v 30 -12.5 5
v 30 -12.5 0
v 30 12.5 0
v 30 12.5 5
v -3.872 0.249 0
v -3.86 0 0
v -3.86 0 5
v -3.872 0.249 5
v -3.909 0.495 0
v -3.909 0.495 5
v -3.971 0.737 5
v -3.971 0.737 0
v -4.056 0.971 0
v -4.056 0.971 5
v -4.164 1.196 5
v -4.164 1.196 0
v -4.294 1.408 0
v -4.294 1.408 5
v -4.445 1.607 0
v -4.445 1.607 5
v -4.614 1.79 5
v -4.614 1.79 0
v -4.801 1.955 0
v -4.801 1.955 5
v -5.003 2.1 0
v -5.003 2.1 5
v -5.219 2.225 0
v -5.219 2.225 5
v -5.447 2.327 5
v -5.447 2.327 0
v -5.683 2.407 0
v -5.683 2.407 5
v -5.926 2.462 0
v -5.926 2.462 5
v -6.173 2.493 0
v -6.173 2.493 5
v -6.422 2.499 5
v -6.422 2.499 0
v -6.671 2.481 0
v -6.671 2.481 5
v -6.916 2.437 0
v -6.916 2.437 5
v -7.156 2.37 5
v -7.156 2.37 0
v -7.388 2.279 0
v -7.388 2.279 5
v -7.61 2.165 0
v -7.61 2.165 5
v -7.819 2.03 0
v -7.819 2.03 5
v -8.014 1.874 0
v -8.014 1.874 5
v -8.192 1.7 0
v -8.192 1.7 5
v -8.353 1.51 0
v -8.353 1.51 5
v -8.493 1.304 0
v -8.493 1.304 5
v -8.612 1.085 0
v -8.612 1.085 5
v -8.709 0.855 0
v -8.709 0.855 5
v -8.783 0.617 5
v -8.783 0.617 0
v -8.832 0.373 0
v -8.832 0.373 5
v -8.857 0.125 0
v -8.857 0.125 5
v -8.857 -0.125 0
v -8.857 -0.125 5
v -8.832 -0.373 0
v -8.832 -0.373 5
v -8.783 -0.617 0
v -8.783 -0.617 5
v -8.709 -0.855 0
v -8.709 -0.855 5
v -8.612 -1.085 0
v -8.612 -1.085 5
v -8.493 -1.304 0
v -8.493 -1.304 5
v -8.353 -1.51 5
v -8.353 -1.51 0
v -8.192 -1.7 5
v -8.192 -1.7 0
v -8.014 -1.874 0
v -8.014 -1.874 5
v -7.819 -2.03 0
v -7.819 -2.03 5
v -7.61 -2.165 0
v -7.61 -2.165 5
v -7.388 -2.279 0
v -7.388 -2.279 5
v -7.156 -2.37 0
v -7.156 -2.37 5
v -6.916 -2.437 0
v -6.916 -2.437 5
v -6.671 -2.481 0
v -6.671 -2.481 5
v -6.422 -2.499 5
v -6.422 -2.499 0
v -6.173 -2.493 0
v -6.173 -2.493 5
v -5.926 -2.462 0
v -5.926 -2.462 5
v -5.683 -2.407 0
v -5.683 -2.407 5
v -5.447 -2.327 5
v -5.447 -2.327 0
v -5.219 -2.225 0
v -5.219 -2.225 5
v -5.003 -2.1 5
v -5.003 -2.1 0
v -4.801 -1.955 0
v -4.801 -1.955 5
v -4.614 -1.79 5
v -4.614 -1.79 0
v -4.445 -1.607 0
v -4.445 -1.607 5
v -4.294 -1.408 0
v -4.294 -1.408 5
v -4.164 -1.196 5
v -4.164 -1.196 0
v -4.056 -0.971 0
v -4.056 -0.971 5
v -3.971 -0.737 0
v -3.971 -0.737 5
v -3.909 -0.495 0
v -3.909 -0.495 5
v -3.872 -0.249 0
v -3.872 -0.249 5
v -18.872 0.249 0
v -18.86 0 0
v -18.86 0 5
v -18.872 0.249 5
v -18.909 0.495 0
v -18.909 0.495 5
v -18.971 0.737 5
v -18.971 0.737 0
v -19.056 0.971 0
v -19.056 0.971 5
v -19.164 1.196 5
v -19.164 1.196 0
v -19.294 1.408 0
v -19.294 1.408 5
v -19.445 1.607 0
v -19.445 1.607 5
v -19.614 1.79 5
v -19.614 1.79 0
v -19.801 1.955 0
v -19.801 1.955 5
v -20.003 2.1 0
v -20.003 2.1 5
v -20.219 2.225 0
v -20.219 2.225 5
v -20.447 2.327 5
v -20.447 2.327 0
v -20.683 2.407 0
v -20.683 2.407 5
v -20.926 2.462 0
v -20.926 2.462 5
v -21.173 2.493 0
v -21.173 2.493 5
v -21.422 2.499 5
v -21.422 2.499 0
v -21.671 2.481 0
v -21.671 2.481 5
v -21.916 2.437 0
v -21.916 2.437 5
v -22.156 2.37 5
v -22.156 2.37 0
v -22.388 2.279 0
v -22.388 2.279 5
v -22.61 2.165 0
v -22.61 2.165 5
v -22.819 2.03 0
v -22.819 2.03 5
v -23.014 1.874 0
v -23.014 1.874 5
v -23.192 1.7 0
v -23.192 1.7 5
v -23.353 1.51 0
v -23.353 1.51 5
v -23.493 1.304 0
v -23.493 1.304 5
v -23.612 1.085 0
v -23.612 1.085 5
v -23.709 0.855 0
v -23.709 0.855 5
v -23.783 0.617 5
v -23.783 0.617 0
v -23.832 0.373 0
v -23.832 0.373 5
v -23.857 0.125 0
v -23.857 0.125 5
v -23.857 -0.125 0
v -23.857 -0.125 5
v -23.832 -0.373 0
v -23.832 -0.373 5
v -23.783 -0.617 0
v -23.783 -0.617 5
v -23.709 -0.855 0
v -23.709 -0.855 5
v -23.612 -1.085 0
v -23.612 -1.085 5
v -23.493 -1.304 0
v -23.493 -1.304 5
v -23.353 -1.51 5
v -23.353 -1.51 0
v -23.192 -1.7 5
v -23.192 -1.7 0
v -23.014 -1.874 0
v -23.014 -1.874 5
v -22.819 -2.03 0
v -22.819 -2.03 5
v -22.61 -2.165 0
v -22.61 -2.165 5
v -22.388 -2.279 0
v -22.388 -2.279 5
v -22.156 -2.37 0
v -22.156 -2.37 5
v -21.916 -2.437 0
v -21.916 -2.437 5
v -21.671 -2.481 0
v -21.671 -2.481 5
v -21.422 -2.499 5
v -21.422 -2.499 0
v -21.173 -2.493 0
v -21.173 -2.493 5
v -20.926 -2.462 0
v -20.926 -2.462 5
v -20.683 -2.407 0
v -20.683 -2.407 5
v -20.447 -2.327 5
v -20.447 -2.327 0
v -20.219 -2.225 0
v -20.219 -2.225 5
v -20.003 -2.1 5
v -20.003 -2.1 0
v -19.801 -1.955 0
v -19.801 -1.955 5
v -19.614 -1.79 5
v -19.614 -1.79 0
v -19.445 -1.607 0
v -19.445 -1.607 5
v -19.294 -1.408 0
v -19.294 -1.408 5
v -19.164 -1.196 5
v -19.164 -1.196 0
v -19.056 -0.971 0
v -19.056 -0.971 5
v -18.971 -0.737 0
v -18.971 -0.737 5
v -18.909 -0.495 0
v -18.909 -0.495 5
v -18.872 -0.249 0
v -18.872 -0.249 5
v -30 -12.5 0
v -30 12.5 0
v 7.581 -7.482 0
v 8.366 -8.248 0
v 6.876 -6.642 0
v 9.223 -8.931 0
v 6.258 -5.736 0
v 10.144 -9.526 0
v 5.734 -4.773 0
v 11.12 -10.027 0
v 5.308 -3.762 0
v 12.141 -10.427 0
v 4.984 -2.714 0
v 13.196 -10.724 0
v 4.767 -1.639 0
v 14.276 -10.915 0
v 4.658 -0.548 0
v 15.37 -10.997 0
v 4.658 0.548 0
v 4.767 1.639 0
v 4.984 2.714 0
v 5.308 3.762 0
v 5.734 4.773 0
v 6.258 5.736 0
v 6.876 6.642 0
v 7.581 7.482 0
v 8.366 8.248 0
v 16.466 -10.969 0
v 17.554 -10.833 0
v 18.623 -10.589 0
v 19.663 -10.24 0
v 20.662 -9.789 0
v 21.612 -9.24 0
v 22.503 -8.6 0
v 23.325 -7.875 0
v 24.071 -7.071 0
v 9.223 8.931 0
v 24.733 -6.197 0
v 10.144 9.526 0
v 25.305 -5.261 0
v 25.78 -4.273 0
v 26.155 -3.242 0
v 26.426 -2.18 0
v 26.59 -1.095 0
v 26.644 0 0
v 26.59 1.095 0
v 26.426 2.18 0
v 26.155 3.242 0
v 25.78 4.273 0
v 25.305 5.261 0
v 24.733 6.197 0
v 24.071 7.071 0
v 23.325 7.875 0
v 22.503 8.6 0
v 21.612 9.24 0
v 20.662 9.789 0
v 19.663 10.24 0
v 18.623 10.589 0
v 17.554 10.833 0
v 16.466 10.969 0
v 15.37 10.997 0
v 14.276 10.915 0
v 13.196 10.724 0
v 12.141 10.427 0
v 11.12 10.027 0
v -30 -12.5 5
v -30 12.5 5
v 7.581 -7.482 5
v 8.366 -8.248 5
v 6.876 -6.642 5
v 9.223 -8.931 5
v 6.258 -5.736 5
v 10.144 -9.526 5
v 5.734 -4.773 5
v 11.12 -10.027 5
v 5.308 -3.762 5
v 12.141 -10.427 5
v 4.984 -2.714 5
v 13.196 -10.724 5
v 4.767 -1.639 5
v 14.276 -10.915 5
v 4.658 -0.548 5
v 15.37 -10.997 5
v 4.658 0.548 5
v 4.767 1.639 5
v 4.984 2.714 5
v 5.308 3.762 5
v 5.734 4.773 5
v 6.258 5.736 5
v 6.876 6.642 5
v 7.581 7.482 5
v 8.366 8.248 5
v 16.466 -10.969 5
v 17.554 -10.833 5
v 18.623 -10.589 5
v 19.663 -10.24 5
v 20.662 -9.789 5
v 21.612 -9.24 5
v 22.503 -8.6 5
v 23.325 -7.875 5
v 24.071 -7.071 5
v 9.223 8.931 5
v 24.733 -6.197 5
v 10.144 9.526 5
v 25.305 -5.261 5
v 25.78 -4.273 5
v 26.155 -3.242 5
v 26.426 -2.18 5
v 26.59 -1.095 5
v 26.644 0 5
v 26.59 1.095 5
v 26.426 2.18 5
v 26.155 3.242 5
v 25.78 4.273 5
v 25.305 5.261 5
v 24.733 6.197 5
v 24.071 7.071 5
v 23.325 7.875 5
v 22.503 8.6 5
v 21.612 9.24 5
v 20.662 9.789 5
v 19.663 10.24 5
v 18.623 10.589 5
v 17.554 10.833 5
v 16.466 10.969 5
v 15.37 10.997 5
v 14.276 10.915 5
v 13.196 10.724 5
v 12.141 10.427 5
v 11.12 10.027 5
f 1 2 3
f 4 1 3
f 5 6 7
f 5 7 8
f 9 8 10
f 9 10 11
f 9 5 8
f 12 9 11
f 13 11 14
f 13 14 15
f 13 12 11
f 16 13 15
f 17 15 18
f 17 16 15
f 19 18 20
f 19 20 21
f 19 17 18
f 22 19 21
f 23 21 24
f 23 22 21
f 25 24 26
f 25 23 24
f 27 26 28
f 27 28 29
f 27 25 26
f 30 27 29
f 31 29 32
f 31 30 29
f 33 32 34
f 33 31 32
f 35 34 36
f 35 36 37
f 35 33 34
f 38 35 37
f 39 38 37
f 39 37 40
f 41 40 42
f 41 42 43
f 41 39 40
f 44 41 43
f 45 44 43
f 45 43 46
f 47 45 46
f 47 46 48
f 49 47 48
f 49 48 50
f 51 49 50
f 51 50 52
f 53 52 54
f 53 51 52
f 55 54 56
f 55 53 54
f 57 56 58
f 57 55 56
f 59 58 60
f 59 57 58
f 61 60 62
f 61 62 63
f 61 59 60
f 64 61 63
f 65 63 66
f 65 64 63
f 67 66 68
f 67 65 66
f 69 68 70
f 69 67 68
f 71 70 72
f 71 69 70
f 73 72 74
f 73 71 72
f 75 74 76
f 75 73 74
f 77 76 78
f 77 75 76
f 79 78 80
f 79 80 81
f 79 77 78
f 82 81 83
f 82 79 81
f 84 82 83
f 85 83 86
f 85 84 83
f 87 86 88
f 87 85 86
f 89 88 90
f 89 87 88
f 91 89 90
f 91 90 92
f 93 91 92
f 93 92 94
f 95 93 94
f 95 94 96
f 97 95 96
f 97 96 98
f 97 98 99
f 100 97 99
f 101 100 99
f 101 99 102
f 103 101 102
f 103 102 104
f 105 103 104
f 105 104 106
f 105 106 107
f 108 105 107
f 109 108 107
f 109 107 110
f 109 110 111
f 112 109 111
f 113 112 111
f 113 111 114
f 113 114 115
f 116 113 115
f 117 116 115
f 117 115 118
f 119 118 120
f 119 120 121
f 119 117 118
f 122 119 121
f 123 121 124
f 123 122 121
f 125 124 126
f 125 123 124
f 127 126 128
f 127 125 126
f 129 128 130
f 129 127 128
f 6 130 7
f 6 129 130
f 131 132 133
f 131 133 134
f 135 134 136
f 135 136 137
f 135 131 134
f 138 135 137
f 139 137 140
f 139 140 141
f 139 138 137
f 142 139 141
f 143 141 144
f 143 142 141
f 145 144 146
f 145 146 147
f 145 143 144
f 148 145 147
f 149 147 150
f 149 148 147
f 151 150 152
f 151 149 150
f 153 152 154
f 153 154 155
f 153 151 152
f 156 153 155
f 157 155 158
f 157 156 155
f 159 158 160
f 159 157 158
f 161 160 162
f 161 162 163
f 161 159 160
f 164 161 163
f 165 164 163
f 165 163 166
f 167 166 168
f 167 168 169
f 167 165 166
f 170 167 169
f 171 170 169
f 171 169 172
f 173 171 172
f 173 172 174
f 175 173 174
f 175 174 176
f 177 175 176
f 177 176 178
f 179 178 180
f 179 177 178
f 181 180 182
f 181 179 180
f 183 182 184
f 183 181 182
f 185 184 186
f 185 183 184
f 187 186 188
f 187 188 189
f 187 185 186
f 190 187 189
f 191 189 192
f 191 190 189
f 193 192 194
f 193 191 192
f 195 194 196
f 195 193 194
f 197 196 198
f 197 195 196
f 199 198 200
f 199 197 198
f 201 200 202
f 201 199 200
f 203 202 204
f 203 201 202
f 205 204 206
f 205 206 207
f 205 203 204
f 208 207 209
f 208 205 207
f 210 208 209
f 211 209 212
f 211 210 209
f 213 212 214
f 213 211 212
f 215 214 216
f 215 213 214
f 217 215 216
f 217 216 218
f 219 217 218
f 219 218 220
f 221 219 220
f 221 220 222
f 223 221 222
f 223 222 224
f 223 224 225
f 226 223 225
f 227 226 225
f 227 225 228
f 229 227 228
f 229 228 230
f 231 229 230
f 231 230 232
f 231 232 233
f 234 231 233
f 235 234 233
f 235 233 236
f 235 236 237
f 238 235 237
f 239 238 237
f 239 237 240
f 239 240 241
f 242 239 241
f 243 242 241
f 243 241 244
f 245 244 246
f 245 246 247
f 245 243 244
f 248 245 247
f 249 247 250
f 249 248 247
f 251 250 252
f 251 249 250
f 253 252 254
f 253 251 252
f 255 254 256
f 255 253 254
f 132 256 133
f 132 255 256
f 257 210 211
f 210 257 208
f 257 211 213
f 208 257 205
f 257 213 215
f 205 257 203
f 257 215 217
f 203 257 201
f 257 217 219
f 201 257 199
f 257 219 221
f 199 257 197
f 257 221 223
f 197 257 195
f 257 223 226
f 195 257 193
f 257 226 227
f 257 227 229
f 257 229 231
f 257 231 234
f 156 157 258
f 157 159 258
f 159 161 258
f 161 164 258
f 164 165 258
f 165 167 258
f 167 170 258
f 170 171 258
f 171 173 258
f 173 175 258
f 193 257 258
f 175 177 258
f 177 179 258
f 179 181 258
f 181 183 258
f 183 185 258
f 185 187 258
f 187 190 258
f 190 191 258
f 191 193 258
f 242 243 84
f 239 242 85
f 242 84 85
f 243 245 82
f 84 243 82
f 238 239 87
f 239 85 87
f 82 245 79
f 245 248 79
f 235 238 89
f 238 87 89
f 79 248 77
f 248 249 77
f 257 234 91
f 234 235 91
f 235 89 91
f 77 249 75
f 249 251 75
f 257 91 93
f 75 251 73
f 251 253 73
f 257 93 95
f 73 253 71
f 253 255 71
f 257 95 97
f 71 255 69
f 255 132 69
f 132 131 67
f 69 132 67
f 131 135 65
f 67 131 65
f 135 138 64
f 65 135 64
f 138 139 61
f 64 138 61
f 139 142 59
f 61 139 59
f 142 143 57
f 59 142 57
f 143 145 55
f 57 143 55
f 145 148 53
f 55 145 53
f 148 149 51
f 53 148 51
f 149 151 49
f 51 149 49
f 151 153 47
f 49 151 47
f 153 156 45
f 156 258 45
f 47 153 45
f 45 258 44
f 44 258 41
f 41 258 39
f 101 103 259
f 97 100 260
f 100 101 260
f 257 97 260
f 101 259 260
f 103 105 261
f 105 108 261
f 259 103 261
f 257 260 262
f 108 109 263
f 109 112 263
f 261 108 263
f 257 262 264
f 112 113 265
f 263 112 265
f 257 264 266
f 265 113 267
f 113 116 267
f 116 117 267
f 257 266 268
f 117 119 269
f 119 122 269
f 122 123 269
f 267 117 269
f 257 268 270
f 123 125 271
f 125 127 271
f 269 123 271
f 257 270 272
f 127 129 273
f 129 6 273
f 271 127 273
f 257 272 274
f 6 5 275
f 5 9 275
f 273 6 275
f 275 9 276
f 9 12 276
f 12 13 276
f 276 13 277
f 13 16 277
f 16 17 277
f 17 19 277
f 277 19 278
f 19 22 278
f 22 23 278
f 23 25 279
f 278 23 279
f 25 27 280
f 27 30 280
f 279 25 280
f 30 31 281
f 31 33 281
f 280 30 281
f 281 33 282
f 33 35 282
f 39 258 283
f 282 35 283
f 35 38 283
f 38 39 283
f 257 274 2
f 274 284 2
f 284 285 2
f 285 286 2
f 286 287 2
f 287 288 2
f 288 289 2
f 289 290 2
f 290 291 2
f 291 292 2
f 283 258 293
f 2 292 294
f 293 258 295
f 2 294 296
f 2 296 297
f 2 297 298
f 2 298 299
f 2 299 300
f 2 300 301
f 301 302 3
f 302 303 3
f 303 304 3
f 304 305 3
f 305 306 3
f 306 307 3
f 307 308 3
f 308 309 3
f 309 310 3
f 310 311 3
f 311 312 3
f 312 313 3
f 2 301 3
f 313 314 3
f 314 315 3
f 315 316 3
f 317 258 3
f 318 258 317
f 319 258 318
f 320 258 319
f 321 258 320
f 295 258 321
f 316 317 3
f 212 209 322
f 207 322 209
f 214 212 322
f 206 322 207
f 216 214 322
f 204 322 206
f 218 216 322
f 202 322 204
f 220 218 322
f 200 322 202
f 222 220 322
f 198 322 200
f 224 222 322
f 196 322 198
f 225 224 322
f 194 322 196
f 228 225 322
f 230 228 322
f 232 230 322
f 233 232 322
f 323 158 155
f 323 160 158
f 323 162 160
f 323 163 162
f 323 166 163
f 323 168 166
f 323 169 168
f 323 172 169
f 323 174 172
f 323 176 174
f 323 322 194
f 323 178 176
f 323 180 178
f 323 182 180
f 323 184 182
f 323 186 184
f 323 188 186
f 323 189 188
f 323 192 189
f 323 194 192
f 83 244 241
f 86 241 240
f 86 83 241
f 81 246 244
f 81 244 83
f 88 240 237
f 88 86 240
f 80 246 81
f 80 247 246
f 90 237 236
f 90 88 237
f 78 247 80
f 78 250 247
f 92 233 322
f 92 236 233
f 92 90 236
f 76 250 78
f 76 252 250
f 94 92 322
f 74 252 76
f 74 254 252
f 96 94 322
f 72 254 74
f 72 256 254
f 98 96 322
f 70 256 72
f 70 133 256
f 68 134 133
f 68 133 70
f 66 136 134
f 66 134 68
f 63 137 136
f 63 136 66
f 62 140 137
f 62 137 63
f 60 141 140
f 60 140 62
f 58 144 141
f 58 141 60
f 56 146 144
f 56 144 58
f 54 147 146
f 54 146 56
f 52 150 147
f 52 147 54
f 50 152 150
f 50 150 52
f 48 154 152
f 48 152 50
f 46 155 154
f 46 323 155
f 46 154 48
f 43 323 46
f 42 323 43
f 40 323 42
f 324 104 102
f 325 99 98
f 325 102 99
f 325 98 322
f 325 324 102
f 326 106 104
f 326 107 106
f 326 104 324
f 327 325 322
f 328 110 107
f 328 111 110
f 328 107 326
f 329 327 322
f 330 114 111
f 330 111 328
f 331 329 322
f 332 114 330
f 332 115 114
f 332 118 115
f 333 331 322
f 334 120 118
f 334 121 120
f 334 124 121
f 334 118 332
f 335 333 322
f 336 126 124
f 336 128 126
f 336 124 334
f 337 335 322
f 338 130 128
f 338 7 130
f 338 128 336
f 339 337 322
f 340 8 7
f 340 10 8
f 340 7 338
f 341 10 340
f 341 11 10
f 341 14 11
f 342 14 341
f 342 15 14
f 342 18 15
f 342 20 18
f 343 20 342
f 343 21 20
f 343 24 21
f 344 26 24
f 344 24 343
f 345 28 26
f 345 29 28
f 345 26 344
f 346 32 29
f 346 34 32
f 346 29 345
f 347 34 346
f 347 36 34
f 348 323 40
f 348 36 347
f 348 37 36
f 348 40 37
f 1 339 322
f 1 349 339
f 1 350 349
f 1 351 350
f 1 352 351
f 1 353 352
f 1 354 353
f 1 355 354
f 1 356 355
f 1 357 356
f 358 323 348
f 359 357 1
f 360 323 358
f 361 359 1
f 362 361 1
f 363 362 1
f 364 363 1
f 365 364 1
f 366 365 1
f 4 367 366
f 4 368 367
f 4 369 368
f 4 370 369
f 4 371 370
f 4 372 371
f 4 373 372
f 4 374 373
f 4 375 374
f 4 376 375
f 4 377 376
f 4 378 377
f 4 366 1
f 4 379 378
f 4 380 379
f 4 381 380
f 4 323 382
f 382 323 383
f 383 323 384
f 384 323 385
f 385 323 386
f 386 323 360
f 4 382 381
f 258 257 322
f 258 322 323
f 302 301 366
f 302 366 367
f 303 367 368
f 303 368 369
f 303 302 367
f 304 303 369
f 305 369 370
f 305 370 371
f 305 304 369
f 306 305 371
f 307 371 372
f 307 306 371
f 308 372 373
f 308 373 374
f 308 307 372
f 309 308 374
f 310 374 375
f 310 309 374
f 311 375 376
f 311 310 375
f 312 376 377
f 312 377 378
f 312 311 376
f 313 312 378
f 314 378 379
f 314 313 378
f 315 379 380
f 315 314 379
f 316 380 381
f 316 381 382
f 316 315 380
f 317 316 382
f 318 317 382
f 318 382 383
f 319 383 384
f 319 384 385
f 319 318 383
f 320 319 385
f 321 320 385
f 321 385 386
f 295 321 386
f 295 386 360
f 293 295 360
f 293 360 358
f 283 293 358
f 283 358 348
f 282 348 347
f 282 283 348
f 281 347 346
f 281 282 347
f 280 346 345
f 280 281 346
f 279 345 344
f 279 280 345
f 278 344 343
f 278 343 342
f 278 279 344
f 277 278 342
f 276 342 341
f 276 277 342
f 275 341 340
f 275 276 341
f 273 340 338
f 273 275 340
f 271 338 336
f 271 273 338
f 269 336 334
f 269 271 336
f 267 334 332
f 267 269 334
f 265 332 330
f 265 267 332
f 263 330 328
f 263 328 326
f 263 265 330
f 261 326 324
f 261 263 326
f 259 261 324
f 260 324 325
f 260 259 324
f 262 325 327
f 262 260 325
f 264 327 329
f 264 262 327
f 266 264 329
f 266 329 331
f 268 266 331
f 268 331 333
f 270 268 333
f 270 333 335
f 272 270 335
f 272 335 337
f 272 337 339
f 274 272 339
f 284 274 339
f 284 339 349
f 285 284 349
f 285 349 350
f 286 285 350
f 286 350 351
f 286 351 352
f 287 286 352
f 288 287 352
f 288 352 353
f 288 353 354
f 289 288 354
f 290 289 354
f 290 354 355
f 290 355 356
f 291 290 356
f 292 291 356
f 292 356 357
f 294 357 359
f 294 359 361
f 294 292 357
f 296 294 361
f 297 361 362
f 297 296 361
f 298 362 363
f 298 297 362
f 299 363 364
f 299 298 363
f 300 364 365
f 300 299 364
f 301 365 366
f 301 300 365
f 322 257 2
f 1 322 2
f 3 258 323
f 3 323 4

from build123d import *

# Parameters (mm, degrees)
SKETCH1_W           = 60
SKETCH1_H           = 25
SKETCH1_R           = 2.5
SKETCH1_R_2         = 11
BOSS_EXTRUDE2_DEPTH = 5


with BuildPart() as part:
    # Sketch1 → Boss-Extrude2 (new body)
    with BuildSketch(Plane.XY):
        Rectangle(SKETCH1_W, SKETCH1_H)
        with Locations((-21.359853693, 0)):
            Circle(SKETCH1_R, mode=Mode.SUBTRACT)
        with Locations((15.644174596, 0)):
            Circle(SKETCH1_R_2, mode=Mode.SUBTRACT)
        with Locations((-6.359853693, 0)):
            Circle(SKETCH1_R, mode=Mode.SUBTRACT)
    extrude(amount=BOSS_EXTRUDE2_DEPTH)


solid = part.part
